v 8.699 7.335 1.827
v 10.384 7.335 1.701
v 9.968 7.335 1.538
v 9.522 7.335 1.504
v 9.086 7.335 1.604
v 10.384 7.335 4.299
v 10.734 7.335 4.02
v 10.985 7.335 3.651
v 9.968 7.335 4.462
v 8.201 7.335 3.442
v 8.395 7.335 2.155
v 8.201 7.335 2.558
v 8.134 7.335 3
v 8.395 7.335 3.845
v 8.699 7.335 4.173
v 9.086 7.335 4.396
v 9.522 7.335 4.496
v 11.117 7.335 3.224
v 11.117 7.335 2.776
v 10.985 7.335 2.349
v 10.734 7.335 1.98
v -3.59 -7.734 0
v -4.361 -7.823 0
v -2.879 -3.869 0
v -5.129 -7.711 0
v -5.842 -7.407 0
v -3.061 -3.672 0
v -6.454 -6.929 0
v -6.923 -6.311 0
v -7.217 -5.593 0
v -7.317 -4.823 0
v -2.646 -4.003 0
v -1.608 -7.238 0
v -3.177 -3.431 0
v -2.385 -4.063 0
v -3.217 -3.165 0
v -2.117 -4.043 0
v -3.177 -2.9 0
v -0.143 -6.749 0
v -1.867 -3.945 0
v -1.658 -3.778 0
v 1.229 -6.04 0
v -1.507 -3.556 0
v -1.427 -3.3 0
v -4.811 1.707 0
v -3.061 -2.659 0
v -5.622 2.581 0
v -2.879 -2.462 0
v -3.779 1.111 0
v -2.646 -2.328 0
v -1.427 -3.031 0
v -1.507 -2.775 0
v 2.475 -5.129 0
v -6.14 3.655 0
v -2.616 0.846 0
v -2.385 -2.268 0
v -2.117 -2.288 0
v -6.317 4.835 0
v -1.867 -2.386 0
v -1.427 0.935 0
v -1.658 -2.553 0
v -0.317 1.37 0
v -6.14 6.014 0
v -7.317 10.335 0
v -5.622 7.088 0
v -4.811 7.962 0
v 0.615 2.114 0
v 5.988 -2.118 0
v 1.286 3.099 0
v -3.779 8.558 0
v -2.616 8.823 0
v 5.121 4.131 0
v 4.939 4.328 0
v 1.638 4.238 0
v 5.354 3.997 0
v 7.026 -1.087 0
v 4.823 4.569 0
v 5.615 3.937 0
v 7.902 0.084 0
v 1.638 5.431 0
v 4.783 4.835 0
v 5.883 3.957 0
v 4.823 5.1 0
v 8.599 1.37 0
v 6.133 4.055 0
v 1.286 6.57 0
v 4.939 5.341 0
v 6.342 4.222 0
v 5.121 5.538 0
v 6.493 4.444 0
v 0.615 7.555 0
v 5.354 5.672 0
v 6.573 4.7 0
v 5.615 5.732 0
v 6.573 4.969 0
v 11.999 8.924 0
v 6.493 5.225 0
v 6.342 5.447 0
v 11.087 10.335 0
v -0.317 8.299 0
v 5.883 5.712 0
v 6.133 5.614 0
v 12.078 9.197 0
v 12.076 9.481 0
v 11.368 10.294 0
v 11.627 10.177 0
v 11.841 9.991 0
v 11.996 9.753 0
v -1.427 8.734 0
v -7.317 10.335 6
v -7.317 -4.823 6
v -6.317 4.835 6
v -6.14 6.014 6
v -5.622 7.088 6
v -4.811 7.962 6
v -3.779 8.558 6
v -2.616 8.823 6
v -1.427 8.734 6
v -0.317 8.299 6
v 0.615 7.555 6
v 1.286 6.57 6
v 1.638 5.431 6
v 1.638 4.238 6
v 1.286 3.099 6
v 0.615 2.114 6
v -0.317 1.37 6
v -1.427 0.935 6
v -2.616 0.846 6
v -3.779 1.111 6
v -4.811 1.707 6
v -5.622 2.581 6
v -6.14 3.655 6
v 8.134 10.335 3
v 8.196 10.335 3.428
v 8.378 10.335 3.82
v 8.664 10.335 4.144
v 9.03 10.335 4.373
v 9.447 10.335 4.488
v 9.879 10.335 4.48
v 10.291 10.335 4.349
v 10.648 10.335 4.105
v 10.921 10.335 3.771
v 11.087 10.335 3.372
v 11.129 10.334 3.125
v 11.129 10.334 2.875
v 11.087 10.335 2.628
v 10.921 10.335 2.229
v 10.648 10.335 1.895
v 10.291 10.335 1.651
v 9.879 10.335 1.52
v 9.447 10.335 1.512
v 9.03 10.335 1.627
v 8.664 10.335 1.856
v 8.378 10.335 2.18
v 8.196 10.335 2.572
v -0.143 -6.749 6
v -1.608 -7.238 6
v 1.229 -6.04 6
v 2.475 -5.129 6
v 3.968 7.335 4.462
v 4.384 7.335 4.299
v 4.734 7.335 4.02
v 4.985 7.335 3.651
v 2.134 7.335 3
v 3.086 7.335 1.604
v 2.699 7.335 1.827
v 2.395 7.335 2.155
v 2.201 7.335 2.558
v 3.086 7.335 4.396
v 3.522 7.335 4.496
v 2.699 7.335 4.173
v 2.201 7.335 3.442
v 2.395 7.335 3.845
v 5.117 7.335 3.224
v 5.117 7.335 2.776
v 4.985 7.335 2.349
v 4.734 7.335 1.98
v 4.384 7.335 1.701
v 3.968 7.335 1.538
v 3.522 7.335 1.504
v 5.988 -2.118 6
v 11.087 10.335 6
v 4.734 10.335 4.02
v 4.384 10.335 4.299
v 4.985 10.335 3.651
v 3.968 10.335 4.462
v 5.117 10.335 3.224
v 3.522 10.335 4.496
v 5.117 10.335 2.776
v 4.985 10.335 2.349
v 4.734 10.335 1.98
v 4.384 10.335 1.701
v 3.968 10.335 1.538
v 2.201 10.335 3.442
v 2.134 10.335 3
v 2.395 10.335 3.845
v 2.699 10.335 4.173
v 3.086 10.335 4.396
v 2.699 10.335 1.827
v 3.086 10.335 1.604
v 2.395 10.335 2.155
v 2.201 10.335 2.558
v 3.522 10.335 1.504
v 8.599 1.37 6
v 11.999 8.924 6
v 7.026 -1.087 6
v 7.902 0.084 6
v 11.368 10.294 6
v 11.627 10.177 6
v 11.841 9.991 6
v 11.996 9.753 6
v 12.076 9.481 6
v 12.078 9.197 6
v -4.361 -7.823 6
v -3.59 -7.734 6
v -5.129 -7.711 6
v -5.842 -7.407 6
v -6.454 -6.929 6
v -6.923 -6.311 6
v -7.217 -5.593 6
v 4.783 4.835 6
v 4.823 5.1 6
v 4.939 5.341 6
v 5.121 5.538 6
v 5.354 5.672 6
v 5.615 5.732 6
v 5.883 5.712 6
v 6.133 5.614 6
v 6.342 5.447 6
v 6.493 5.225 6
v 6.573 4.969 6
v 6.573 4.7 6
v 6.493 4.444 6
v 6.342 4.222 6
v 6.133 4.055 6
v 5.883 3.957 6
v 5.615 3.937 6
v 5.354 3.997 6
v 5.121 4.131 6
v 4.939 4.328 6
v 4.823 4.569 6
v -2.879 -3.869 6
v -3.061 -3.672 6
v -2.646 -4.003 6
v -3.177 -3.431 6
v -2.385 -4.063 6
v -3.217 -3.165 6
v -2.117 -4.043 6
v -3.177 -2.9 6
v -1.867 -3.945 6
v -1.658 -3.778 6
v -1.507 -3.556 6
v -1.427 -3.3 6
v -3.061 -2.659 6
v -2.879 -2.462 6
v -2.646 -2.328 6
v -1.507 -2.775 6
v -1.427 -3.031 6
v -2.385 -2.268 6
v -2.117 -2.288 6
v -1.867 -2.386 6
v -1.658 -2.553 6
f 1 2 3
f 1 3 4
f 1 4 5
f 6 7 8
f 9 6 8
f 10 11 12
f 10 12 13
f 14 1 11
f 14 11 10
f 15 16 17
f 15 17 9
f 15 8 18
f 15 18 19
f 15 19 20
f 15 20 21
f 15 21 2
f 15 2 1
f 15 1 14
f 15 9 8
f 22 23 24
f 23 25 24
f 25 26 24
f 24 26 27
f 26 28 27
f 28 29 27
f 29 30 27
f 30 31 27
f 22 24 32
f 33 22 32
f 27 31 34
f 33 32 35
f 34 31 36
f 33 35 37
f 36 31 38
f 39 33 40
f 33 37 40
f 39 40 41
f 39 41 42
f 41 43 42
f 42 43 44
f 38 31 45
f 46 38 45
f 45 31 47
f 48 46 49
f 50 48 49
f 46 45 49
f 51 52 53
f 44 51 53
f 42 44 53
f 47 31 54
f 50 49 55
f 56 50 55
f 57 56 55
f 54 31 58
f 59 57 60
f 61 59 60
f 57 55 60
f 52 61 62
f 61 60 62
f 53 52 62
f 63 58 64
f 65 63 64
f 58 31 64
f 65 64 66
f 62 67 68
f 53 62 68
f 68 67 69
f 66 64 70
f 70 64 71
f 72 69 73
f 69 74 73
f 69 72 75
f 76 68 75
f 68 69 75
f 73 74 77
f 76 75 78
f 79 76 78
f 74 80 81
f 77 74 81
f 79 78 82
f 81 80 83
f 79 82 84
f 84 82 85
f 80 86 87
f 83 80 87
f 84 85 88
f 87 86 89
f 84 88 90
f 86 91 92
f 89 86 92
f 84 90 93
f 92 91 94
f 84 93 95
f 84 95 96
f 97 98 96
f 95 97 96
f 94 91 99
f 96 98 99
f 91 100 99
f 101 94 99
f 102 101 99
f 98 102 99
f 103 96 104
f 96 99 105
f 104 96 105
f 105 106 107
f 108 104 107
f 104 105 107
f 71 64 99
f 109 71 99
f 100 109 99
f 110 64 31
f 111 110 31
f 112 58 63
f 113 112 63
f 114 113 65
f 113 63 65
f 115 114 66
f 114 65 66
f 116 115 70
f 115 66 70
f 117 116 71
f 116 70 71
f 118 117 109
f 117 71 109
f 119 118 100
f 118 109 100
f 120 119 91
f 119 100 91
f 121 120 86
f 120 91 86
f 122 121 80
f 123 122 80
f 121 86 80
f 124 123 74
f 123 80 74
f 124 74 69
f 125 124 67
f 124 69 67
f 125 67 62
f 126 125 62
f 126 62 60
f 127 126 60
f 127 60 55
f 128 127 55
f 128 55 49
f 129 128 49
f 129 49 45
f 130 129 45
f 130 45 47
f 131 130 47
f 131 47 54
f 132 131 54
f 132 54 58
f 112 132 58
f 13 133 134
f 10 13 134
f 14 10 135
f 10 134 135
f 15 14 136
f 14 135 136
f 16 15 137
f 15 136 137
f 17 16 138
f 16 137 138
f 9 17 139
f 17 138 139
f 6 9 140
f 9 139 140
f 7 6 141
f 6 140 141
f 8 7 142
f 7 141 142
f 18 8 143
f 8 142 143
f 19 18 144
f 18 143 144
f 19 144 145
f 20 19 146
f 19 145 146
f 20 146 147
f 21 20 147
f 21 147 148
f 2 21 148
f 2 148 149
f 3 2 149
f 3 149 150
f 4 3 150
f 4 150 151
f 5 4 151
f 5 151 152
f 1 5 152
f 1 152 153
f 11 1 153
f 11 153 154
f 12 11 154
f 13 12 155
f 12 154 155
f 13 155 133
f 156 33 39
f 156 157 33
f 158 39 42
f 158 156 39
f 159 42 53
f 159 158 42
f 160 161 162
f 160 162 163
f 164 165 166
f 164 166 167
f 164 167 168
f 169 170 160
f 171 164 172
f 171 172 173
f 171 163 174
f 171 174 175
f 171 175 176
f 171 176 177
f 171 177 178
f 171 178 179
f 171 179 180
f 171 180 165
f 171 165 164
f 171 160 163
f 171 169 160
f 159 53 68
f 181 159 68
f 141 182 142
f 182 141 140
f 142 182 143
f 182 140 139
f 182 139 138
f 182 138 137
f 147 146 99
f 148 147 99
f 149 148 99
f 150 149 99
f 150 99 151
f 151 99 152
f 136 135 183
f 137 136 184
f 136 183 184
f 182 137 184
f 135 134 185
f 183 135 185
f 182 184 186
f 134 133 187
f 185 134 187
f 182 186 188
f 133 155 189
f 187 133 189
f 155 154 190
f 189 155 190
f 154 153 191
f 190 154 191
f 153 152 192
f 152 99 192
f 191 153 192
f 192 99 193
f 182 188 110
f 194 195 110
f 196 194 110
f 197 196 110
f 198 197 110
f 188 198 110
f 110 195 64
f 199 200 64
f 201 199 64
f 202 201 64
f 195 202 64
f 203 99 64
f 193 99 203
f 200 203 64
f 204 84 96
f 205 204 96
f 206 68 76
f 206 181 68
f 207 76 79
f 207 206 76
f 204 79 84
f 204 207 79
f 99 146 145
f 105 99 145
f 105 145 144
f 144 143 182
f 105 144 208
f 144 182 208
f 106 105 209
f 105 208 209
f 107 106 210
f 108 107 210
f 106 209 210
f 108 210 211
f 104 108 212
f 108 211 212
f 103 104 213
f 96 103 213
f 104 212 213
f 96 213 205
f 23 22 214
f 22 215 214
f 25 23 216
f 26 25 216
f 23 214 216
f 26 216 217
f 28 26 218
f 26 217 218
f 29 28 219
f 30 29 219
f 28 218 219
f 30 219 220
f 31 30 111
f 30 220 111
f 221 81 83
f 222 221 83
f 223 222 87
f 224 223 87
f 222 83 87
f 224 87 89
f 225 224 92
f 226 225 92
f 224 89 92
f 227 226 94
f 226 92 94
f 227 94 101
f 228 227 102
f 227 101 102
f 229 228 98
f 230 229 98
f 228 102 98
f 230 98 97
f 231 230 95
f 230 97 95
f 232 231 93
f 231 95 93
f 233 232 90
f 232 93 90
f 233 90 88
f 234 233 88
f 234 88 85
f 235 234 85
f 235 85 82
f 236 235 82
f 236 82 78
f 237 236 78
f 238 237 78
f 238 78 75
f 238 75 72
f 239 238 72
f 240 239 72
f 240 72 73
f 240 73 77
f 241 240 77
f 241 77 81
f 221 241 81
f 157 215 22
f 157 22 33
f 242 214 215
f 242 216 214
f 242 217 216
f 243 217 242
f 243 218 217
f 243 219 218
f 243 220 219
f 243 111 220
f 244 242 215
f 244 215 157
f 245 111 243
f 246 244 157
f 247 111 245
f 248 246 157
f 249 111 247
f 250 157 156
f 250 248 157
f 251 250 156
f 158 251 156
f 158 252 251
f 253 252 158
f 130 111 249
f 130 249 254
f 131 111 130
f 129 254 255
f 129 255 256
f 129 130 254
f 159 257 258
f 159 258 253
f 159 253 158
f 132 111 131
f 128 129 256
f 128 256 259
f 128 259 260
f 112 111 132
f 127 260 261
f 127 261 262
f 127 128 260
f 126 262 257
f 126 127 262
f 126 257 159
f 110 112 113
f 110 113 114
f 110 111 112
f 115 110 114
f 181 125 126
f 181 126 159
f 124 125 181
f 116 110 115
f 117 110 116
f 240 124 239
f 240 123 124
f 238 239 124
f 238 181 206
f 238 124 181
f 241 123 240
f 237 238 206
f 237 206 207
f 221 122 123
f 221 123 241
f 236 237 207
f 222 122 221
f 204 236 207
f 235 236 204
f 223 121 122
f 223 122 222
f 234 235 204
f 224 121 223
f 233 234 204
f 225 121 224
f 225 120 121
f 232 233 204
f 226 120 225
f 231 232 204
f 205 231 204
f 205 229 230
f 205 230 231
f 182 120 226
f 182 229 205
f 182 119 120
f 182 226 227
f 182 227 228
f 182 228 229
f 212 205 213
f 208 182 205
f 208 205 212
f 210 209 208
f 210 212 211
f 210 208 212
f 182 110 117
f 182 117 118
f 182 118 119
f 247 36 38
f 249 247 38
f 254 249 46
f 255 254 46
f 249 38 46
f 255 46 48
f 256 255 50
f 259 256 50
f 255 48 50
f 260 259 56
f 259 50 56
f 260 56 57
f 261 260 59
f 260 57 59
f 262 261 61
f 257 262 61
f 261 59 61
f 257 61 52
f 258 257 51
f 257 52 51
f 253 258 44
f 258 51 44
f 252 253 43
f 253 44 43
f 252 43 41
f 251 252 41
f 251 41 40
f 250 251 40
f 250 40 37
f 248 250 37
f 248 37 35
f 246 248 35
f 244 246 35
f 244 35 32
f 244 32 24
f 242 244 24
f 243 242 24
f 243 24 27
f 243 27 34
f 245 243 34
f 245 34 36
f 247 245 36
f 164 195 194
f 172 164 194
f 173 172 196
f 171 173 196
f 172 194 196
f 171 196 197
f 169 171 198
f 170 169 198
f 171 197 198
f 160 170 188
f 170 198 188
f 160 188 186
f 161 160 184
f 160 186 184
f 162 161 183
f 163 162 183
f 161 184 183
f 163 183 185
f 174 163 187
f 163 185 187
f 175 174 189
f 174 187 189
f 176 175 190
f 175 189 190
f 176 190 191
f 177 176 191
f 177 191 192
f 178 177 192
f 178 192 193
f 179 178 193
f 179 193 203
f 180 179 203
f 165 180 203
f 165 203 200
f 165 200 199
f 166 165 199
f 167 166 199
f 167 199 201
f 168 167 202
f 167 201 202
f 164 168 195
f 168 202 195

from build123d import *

# Parameters (mm, degrees)
BOSS_EXTRU_1_DEPTH      = 6
ESQUISSE5_R             = 4
ESQUISSE5_R_2           = 0.9
ENL_V_MAT_EXTRU_1_DEPTH = 18.390190711
CONG_3_R                = 10
CONG_4_R                = 3
CONG_5_R                = 1
ESQUISSE10_R            = 1.5
ENL_V_MAT_EXTRU_7_DEPTH = 3


with BuildPart() as part:
    # Esquisse2 → Boss.-Extru.1 (new body)
    with BuildSketch(Plane.XY):
        Polygon((-7.317378298, -8.665499885), (0.682621702, -6.665499885), (7.682621702, -0.665499885), (12.633955847, 10.334500115), (7.682621702, 10.334500115), (-7.317378298, 10.334500115), align=None)
    extrude(amount=BOSS_EXTRU_1_DEPTH)

    # Esquisse5 → Enlèv. mat.-Extru.1 (cut, through all)
    with BuildSketch(Plane(origin=(0, 0, 0), x_dir=(-1, 0, 0), z_dir=(0, 0, -1))):
        with Locations((2.317378298, 4.834500115)):
            Circle(ESQUISSE5_R)
        with Locations((-5.682621702, 4.834500115)):
            Circle(ESQUISSE5_R_2)
        with Locations((2.317378298, -3.165499885)):
            Circle(ESQUISSE5_R_2)
    extrude(amount=-ENL_V_MAT_EXTRU_1_DEPTH, mode=Mode.SUBTRACT)

    # Congé3
    cong_3_edges = [part.edges().sort_by_distance(p)[0] for p in [
        (7.682621702, -0.665499885, 3),
        (0.682621702, -6.665499885, 3),
    ]]
    fillet(cong_3_edges, radius=CONG_3_R)

    # Congé4
    cong_4_edges = [part.edges().sort_by_distance(p)[0] for p in [
        (-7.317378298, -8.665499885, 3),
    ]]
    fillet(cong_4_edges, radius=CONG_4_R)

    # Congé5
    cong_5_edges = [part.edges().sort_by_distance(p)[0] for p in [
        (12.633955847, 10.334500115, 3),
    ]]
    fillet(cong_5_edges, radius=CONG_5_R)

    # Esquisse10 → Enlèv. mat.-Extru.7 (cut)
    with BuildSketch(Plane(origin=(0, 10.334500115, 0), x_dir=(1, 0, 0), z_dir=(0, 1, 0))):
        with Locations(Location((3.633955847, -3, 0), (0, 0, 180))):
            Circle(ESQUISSE10_R)
        with Locations(Location((9.633955847, -3, 0), (0, 0, 180))):
            Circle(ESQUISSE10_R)
    extrude(amount=-ENL_V_MAT_EXTRU_7_DEPTH, mode=Mode.SUBTRACT)


solid = part.part
